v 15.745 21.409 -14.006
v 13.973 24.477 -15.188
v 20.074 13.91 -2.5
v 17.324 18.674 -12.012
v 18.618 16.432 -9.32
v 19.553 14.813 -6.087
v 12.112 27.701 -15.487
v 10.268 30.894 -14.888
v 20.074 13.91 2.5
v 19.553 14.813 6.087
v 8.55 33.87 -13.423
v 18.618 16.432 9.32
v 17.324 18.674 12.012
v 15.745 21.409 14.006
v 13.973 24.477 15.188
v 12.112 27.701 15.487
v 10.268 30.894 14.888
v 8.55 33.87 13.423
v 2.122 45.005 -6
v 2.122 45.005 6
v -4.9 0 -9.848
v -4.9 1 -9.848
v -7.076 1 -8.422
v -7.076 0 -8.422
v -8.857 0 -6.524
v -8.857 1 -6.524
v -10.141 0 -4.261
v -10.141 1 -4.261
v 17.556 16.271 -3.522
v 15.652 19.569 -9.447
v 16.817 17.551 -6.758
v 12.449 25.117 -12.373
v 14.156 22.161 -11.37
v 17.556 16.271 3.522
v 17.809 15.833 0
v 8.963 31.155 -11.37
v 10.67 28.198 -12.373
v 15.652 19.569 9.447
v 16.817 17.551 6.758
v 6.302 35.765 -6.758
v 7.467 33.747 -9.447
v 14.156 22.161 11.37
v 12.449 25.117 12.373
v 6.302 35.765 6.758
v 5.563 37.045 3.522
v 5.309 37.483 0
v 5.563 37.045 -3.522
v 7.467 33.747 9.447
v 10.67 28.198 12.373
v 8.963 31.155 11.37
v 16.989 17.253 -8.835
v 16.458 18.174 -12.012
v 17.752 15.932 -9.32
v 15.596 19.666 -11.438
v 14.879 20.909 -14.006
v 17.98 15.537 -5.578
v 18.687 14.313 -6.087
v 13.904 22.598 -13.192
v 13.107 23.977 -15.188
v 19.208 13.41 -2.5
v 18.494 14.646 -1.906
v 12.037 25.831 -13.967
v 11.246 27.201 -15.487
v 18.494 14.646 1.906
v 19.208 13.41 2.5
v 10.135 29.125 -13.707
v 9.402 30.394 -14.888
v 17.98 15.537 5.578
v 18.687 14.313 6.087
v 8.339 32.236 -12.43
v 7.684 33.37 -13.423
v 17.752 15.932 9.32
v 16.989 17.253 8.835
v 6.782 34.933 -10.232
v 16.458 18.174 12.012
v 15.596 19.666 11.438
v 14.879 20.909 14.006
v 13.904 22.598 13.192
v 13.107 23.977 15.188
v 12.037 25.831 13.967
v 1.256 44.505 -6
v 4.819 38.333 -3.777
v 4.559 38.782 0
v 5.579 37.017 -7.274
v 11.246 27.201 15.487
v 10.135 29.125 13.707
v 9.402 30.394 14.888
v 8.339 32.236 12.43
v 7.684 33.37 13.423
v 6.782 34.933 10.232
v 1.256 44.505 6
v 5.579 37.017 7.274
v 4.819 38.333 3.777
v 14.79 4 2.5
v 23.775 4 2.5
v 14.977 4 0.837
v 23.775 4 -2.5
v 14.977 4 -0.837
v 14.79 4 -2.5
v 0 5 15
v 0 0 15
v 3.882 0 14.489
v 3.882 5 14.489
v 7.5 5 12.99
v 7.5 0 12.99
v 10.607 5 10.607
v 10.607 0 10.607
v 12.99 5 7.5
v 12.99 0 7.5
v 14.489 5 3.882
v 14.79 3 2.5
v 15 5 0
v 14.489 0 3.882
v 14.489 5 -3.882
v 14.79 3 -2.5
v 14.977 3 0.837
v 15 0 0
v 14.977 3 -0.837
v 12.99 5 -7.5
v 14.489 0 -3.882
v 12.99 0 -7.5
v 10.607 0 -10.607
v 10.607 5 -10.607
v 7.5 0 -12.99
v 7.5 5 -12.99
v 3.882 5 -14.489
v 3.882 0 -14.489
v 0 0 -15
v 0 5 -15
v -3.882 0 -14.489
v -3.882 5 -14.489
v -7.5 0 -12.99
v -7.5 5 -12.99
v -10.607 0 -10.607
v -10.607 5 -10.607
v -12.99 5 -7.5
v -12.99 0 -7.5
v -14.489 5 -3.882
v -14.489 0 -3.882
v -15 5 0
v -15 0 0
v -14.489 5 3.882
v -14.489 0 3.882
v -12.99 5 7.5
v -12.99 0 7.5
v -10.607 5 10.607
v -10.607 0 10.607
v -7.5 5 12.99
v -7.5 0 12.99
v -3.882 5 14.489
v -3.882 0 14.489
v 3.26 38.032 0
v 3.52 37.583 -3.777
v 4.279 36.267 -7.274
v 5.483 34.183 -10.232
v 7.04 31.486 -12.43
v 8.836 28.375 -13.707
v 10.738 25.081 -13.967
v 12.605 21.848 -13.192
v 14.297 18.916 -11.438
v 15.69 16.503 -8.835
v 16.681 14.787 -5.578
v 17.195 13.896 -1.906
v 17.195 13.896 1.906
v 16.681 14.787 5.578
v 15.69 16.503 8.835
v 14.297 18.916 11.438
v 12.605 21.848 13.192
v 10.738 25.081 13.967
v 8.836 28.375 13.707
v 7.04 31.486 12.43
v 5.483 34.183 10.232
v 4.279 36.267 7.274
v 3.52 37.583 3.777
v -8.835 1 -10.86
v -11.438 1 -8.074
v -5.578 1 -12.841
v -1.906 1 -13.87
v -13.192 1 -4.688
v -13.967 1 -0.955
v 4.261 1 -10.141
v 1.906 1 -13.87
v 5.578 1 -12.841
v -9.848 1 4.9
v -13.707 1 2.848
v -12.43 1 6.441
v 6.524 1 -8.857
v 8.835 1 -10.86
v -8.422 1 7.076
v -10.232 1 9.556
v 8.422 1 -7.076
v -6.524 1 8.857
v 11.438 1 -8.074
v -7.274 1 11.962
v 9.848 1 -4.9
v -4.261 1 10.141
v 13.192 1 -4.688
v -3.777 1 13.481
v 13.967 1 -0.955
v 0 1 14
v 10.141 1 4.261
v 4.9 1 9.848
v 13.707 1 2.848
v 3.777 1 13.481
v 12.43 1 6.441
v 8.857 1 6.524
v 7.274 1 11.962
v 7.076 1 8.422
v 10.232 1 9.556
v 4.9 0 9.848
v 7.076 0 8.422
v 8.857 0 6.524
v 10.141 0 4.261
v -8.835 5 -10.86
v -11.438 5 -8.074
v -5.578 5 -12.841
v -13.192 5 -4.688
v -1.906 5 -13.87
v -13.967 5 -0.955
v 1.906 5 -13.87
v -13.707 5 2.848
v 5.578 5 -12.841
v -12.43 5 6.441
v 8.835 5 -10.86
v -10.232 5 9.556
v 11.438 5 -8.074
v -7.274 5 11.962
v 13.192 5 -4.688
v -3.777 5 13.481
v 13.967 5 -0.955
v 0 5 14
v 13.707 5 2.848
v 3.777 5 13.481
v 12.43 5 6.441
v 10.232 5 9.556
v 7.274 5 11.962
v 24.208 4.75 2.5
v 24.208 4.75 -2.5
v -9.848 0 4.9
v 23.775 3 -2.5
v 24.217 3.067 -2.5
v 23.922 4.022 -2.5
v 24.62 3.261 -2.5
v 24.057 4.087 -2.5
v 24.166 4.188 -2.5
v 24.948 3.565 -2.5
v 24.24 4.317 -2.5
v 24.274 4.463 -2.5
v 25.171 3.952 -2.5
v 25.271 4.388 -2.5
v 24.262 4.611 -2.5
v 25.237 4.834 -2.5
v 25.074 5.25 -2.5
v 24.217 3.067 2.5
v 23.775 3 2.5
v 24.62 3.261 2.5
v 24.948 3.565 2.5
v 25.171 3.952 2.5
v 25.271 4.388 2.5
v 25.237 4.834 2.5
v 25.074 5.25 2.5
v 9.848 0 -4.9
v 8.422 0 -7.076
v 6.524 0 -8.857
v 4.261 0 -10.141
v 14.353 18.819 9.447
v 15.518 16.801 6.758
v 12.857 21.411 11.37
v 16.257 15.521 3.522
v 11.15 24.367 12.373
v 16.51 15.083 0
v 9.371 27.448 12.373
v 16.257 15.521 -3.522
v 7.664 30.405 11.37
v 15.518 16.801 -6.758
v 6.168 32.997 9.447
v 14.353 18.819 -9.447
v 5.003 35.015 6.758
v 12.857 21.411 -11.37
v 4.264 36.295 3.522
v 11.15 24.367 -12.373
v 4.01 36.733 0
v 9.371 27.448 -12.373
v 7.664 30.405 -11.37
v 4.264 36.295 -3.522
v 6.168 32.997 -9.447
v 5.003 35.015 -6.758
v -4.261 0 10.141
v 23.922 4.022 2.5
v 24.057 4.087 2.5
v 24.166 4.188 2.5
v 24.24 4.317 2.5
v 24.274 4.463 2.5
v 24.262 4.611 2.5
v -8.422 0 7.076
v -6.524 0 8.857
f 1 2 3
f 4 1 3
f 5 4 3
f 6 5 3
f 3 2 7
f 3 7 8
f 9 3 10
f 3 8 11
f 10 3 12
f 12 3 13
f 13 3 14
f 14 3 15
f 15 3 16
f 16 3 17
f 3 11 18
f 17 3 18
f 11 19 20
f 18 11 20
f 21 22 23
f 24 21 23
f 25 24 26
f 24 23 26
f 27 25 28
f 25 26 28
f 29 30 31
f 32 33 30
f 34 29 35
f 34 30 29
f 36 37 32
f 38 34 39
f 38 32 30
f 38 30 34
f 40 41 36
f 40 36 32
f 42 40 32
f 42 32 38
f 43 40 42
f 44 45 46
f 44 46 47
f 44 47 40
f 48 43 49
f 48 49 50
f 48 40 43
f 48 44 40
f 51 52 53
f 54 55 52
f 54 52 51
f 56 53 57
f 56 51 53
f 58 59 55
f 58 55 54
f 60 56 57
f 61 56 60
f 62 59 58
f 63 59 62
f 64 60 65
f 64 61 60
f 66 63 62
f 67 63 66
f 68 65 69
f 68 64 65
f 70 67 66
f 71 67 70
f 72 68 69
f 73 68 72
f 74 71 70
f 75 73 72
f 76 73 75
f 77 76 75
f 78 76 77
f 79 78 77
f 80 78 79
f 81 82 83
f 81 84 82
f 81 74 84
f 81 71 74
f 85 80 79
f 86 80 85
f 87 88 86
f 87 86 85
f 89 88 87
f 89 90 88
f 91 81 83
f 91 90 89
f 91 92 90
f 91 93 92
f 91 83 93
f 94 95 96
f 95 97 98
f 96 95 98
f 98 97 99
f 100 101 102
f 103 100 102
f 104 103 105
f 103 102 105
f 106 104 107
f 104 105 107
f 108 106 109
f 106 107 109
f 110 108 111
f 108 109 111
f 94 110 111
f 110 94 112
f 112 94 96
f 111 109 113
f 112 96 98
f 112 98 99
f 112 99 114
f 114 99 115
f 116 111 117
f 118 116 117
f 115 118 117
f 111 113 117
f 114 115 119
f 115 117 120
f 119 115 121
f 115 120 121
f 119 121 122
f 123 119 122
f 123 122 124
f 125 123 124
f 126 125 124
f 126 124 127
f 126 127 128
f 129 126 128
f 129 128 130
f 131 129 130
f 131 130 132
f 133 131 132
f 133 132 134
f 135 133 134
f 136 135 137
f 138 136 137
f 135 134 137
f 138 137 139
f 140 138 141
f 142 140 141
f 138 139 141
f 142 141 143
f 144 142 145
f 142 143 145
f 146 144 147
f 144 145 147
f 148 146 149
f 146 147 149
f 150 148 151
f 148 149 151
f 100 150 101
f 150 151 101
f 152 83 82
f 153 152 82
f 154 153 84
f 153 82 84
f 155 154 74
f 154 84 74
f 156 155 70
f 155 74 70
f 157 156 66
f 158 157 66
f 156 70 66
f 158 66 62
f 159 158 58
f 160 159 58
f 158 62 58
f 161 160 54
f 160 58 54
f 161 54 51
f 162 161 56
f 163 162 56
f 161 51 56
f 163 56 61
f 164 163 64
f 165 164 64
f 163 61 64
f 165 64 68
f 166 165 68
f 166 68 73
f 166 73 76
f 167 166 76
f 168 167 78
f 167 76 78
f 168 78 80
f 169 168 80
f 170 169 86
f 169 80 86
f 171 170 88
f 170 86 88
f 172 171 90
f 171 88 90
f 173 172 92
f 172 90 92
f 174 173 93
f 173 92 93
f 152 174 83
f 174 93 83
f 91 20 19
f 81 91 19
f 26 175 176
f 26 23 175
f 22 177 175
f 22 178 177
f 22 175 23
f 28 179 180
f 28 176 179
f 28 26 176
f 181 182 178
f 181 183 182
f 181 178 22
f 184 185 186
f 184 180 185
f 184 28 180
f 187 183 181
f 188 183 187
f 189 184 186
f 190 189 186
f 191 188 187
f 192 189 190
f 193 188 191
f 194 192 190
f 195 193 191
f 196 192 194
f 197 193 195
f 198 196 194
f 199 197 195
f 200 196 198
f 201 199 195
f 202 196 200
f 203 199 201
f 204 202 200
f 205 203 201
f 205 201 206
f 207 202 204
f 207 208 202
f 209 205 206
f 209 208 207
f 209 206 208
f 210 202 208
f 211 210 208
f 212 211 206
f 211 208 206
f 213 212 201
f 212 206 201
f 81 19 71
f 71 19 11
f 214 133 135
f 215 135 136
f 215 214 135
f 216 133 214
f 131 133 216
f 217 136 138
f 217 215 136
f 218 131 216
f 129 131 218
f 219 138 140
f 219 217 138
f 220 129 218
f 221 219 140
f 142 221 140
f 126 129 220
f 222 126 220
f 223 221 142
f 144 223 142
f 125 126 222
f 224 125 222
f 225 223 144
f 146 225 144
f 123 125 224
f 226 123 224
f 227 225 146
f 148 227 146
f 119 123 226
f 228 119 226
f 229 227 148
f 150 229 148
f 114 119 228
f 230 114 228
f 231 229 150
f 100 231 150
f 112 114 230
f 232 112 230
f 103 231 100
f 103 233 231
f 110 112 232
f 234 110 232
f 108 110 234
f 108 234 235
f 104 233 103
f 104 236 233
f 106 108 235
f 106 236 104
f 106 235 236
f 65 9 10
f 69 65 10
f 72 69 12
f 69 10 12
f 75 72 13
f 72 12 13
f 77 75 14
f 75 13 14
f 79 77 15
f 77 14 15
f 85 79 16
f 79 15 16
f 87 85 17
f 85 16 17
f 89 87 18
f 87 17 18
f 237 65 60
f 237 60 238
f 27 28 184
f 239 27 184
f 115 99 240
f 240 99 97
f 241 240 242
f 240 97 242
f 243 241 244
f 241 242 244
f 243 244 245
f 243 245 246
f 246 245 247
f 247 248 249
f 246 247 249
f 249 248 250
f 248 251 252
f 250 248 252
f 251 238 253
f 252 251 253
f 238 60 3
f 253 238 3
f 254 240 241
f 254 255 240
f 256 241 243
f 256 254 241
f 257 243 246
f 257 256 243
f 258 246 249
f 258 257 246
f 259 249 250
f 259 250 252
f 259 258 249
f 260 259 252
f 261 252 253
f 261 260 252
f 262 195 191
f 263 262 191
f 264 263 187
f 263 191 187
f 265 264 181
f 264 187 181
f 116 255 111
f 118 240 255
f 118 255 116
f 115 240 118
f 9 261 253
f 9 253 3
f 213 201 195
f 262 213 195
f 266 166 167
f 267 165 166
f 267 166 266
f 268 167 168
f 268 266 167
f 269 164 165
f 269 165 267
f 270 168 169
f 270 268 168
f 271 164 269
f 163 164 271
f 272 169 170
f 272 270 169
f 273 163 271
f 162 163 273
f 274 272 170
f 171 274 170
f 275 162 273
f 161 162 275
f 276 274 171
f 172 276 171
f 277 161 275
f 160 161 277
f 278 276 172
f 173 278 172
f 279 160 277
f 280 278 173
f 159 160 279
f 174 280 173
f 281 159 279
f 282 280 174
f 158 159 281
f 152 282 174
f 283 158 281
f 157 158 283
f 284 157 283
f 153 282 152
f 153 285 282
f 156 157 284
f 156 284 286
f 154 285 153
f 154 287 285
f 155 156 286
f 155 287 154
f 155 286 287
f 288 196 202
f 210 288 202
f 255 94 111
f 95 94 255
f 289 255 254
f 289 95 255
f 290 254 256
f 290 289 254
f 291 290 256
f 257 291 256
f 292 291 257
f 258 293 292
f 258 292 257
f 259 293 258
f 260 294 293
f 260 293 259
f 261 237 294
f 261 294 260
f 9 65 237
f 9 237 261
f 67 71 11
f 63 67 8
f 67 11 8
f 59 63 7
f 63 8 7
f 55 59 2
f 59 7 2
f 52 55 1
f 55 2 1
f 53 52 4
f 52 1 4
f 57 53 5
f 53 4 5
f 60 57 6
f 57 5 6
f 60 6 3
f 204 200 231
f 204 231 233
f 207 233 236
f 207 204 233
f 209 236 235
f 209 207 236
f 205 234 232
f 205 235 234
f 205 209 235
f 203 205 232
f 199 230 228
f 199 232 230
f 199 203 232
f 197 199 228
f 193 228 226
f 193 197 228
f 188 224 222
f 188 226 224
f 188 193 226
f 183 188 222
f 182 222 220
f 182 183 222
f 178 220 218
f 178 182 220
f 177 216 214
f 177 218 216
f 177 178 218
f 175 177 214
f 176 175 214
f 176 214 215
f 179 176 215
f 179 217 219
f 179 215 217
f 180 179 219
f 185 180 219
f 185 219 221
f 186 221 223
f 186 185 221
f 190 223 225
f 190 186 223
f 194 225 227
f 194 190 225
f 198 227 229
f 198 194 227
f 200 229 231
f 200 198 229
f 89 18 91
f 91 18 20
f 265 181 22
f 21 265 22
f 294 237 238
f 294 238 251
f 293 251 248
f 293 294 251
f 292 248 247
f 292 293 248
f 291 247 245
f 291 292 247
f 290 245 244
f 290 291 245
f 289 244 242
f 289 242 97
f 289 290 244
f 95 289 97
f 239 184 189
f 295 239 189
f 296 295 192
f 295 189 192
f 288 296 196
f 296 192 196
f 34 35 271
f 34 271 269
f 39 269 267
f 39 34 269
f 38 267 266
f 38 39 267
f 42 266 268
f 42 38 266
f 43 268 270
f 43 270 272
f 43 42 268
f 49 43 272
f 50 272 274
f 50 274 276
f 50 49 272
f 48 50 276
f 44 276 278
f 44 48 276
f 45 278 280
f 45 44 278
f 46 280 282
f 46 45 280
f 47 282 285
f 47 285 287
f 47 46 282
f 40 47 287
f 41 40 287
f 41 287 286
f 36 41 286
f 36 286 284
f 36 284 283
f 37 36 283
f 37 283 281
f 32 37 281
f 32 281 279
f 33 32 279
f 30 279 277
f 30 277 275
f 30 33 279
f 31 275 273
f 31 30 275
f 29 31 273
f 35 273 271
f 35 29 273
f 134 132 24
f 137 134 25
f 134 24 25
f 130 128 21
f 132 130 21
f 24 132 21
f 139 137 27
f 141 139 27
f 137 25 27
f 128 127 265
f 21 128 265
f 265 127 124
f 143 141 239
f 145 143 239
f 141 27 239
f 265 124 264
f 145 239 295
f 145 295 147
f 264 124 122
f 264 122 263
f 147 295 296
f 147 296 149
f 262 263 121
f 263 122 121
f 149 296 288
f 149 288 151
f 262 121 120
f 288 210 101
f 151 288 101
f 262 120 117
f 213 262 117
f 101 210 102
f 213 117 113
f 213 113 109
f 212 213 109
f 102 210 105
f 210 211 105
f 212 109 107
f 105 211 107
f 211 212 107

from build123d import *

# Parameters (mm, degrees)
SKETCH_1_R          = 15
EXTRUDE_1_DEPTH     = 5
SHELL_1_T           = -1
CUT_EXTRUDE_1_DEPTH = 5
EXTRUDE_2_DEPTH     = 1
EXTRUDE_3_DEPTH     = 2.5
EXTRUDE_6_DEPTH     = 1
SKETCH_6_R          = 14
SKETCH_6_R_2        = 12.5
EXTRUDE_7_DEPTH     = 1.5


with BuildPart() as part:
    # 草图1 → 凸台-拉伸1 (new body)
    with BuildSketch(Plane(origin=(0, 0, 0), x_dir=(1, 0, 0), z_dir=(0, 1, 0))):
        with Locations(Location((0, 0, 0), (0, 0, 270))):
            Circle(SKETCH_1_R)
    extrude(amount=EXTRUDE_1_DEPTH)

    # 抽壳1
    shell_1_openings = [part.faces().sort_by_distance(p)[0] for p in [
        (0, 5, 0),
    ]]
    offset(amount=SHELL_1_T, openings=shell_1_openings, kind=Kind.INTERSECTION)

    # 草图2 → 切除-拉伸1 (cut)
    with BuildSketch(Plane(origin=(0, 1, 0), x_dir=(1, 0, 0), z_dir=(0, 1, 0))):
        with BuildLine():
            Line((-10.141362356, 4.260606713), (-9.848418855, -4.89986184))
            ThreePointArc((-9.848418855, -4.89986184), (-7.525588518, -8.022812316), (-4.260606713, -10.141362356))
            Line((-4.260606713, -10.141362356), (4.89986184, -9.848418855))
            ThreePointArc((4.89986184, -9.848418855), (8.022812316, -7.525588518), (10.141362356, -4.260606713))
            Line((10.141362356, -4.260606713), (9.848418855, 4.89986184))
            ThreePointArc((9.848418855, 4.89986184), (7.525588518, 8.022812316), (4.260606713, 10.141362356))
            Line((4.260606713, 10.141362356), (-4.89986184, 9.848418855))
            ThreePointArc((-4.89986184, 9.848418855), (-8.022812316, 7.525588518), (-10.141362356, 4.260606713))
        make_face()
    extrude(amount=-CUT_EXTRUDE_1_DEPTH, mode=Mode.SUBTRACT)

    # 草图3 → 凸台-拉伸2 (add)
    with BuildSketch(Plane(origin=(0, 3, 0), x_dir=(-1, 0, 0), z_dir=(0, -1, 0))):
        with BuildLine():
            Line((-14.790199458, 2.5), (-23.774977314, 2.5))
            Line((-23.774977314, 2.5), (-23.774977314, -2.5))
            Line((-23.774977314, -2.5), (-14.790199458, -2.5))
            ThreePointArc((-14.790199458, -2.5), (-15, 0), (-14.790199458, 2.5))
        make_face()
    extrude(amount=-EXTRUDE_2_DEPTH)

    # 草图4 → 凸台-拉伸3 (add, symmetric)
    with BuildSketch(Plane.XY):
        with BuildLine():
            Line((20.07401542, 13.910254038), (19.207990016, 13.410254038))
            Line((19.207990016, 13.410254038), (24.207990016, 4.75))
            ThreePointArc((24.207990016, 4.75), (24.207990016, 4.25), (23.774977314, 4))
            Line((23.774977314, 4), (23.774977314, 3))
            ThreePointArc((23.774977314, 3), (25.07401542, 3.75), (25.07401542, 5.25))
            Line((25.07401542, 5.25), (20.07401542, 13.910254038))
        make_face()
    extrude(amount=EXTRUDE_3_DEPTH, both=True)

    # 草图5 → 凸台-拉伸6 (add)
    with BuildSketch(Plane(origin=(21.07882825, 12.169867164, 0), x_dir=(0, 0, 1), z_dir=(-0.8660254037844399, -0.49999999999999806, 0))):
        with BuildLine():
            Line((6, 37.914379355), (-6, 37.914379355))
            Line((-6, 37.914379355), (-13.423393759, 25.056684201))
            ThreePointArc((-13.423393759, 25.056684201), (0, 1.806684201), (13.423393759, 25.056684201))
            Line((13.423393759, 25.056684201), (6, 37.914379355))
        make_face()
    extrude(amount=EXTRUDE_6_DEPTH)

    # 草图6 → 凸台-拉伸7 (add)
    with BuildSketch(Plane(origin=(20.212802846, 11.669867164, 0), x_dir=(0, 0, 1), z_dir=(-0.86602540378444, -0.4999999999999978, 0))):
        with Locations(Location((0, 17.306684201, 0), (0, 0, 90))):
            Circle(SKETCH_6_R)
        with Locations(Location((0, 17.306684201, 0), (0, 0, 270))):
            Circle(SKETCH_6_R_2, mode=Mode.SUBTRACT)
    extrude(amount=EXTRUDE_7_DEPTH)


solid = part.part
